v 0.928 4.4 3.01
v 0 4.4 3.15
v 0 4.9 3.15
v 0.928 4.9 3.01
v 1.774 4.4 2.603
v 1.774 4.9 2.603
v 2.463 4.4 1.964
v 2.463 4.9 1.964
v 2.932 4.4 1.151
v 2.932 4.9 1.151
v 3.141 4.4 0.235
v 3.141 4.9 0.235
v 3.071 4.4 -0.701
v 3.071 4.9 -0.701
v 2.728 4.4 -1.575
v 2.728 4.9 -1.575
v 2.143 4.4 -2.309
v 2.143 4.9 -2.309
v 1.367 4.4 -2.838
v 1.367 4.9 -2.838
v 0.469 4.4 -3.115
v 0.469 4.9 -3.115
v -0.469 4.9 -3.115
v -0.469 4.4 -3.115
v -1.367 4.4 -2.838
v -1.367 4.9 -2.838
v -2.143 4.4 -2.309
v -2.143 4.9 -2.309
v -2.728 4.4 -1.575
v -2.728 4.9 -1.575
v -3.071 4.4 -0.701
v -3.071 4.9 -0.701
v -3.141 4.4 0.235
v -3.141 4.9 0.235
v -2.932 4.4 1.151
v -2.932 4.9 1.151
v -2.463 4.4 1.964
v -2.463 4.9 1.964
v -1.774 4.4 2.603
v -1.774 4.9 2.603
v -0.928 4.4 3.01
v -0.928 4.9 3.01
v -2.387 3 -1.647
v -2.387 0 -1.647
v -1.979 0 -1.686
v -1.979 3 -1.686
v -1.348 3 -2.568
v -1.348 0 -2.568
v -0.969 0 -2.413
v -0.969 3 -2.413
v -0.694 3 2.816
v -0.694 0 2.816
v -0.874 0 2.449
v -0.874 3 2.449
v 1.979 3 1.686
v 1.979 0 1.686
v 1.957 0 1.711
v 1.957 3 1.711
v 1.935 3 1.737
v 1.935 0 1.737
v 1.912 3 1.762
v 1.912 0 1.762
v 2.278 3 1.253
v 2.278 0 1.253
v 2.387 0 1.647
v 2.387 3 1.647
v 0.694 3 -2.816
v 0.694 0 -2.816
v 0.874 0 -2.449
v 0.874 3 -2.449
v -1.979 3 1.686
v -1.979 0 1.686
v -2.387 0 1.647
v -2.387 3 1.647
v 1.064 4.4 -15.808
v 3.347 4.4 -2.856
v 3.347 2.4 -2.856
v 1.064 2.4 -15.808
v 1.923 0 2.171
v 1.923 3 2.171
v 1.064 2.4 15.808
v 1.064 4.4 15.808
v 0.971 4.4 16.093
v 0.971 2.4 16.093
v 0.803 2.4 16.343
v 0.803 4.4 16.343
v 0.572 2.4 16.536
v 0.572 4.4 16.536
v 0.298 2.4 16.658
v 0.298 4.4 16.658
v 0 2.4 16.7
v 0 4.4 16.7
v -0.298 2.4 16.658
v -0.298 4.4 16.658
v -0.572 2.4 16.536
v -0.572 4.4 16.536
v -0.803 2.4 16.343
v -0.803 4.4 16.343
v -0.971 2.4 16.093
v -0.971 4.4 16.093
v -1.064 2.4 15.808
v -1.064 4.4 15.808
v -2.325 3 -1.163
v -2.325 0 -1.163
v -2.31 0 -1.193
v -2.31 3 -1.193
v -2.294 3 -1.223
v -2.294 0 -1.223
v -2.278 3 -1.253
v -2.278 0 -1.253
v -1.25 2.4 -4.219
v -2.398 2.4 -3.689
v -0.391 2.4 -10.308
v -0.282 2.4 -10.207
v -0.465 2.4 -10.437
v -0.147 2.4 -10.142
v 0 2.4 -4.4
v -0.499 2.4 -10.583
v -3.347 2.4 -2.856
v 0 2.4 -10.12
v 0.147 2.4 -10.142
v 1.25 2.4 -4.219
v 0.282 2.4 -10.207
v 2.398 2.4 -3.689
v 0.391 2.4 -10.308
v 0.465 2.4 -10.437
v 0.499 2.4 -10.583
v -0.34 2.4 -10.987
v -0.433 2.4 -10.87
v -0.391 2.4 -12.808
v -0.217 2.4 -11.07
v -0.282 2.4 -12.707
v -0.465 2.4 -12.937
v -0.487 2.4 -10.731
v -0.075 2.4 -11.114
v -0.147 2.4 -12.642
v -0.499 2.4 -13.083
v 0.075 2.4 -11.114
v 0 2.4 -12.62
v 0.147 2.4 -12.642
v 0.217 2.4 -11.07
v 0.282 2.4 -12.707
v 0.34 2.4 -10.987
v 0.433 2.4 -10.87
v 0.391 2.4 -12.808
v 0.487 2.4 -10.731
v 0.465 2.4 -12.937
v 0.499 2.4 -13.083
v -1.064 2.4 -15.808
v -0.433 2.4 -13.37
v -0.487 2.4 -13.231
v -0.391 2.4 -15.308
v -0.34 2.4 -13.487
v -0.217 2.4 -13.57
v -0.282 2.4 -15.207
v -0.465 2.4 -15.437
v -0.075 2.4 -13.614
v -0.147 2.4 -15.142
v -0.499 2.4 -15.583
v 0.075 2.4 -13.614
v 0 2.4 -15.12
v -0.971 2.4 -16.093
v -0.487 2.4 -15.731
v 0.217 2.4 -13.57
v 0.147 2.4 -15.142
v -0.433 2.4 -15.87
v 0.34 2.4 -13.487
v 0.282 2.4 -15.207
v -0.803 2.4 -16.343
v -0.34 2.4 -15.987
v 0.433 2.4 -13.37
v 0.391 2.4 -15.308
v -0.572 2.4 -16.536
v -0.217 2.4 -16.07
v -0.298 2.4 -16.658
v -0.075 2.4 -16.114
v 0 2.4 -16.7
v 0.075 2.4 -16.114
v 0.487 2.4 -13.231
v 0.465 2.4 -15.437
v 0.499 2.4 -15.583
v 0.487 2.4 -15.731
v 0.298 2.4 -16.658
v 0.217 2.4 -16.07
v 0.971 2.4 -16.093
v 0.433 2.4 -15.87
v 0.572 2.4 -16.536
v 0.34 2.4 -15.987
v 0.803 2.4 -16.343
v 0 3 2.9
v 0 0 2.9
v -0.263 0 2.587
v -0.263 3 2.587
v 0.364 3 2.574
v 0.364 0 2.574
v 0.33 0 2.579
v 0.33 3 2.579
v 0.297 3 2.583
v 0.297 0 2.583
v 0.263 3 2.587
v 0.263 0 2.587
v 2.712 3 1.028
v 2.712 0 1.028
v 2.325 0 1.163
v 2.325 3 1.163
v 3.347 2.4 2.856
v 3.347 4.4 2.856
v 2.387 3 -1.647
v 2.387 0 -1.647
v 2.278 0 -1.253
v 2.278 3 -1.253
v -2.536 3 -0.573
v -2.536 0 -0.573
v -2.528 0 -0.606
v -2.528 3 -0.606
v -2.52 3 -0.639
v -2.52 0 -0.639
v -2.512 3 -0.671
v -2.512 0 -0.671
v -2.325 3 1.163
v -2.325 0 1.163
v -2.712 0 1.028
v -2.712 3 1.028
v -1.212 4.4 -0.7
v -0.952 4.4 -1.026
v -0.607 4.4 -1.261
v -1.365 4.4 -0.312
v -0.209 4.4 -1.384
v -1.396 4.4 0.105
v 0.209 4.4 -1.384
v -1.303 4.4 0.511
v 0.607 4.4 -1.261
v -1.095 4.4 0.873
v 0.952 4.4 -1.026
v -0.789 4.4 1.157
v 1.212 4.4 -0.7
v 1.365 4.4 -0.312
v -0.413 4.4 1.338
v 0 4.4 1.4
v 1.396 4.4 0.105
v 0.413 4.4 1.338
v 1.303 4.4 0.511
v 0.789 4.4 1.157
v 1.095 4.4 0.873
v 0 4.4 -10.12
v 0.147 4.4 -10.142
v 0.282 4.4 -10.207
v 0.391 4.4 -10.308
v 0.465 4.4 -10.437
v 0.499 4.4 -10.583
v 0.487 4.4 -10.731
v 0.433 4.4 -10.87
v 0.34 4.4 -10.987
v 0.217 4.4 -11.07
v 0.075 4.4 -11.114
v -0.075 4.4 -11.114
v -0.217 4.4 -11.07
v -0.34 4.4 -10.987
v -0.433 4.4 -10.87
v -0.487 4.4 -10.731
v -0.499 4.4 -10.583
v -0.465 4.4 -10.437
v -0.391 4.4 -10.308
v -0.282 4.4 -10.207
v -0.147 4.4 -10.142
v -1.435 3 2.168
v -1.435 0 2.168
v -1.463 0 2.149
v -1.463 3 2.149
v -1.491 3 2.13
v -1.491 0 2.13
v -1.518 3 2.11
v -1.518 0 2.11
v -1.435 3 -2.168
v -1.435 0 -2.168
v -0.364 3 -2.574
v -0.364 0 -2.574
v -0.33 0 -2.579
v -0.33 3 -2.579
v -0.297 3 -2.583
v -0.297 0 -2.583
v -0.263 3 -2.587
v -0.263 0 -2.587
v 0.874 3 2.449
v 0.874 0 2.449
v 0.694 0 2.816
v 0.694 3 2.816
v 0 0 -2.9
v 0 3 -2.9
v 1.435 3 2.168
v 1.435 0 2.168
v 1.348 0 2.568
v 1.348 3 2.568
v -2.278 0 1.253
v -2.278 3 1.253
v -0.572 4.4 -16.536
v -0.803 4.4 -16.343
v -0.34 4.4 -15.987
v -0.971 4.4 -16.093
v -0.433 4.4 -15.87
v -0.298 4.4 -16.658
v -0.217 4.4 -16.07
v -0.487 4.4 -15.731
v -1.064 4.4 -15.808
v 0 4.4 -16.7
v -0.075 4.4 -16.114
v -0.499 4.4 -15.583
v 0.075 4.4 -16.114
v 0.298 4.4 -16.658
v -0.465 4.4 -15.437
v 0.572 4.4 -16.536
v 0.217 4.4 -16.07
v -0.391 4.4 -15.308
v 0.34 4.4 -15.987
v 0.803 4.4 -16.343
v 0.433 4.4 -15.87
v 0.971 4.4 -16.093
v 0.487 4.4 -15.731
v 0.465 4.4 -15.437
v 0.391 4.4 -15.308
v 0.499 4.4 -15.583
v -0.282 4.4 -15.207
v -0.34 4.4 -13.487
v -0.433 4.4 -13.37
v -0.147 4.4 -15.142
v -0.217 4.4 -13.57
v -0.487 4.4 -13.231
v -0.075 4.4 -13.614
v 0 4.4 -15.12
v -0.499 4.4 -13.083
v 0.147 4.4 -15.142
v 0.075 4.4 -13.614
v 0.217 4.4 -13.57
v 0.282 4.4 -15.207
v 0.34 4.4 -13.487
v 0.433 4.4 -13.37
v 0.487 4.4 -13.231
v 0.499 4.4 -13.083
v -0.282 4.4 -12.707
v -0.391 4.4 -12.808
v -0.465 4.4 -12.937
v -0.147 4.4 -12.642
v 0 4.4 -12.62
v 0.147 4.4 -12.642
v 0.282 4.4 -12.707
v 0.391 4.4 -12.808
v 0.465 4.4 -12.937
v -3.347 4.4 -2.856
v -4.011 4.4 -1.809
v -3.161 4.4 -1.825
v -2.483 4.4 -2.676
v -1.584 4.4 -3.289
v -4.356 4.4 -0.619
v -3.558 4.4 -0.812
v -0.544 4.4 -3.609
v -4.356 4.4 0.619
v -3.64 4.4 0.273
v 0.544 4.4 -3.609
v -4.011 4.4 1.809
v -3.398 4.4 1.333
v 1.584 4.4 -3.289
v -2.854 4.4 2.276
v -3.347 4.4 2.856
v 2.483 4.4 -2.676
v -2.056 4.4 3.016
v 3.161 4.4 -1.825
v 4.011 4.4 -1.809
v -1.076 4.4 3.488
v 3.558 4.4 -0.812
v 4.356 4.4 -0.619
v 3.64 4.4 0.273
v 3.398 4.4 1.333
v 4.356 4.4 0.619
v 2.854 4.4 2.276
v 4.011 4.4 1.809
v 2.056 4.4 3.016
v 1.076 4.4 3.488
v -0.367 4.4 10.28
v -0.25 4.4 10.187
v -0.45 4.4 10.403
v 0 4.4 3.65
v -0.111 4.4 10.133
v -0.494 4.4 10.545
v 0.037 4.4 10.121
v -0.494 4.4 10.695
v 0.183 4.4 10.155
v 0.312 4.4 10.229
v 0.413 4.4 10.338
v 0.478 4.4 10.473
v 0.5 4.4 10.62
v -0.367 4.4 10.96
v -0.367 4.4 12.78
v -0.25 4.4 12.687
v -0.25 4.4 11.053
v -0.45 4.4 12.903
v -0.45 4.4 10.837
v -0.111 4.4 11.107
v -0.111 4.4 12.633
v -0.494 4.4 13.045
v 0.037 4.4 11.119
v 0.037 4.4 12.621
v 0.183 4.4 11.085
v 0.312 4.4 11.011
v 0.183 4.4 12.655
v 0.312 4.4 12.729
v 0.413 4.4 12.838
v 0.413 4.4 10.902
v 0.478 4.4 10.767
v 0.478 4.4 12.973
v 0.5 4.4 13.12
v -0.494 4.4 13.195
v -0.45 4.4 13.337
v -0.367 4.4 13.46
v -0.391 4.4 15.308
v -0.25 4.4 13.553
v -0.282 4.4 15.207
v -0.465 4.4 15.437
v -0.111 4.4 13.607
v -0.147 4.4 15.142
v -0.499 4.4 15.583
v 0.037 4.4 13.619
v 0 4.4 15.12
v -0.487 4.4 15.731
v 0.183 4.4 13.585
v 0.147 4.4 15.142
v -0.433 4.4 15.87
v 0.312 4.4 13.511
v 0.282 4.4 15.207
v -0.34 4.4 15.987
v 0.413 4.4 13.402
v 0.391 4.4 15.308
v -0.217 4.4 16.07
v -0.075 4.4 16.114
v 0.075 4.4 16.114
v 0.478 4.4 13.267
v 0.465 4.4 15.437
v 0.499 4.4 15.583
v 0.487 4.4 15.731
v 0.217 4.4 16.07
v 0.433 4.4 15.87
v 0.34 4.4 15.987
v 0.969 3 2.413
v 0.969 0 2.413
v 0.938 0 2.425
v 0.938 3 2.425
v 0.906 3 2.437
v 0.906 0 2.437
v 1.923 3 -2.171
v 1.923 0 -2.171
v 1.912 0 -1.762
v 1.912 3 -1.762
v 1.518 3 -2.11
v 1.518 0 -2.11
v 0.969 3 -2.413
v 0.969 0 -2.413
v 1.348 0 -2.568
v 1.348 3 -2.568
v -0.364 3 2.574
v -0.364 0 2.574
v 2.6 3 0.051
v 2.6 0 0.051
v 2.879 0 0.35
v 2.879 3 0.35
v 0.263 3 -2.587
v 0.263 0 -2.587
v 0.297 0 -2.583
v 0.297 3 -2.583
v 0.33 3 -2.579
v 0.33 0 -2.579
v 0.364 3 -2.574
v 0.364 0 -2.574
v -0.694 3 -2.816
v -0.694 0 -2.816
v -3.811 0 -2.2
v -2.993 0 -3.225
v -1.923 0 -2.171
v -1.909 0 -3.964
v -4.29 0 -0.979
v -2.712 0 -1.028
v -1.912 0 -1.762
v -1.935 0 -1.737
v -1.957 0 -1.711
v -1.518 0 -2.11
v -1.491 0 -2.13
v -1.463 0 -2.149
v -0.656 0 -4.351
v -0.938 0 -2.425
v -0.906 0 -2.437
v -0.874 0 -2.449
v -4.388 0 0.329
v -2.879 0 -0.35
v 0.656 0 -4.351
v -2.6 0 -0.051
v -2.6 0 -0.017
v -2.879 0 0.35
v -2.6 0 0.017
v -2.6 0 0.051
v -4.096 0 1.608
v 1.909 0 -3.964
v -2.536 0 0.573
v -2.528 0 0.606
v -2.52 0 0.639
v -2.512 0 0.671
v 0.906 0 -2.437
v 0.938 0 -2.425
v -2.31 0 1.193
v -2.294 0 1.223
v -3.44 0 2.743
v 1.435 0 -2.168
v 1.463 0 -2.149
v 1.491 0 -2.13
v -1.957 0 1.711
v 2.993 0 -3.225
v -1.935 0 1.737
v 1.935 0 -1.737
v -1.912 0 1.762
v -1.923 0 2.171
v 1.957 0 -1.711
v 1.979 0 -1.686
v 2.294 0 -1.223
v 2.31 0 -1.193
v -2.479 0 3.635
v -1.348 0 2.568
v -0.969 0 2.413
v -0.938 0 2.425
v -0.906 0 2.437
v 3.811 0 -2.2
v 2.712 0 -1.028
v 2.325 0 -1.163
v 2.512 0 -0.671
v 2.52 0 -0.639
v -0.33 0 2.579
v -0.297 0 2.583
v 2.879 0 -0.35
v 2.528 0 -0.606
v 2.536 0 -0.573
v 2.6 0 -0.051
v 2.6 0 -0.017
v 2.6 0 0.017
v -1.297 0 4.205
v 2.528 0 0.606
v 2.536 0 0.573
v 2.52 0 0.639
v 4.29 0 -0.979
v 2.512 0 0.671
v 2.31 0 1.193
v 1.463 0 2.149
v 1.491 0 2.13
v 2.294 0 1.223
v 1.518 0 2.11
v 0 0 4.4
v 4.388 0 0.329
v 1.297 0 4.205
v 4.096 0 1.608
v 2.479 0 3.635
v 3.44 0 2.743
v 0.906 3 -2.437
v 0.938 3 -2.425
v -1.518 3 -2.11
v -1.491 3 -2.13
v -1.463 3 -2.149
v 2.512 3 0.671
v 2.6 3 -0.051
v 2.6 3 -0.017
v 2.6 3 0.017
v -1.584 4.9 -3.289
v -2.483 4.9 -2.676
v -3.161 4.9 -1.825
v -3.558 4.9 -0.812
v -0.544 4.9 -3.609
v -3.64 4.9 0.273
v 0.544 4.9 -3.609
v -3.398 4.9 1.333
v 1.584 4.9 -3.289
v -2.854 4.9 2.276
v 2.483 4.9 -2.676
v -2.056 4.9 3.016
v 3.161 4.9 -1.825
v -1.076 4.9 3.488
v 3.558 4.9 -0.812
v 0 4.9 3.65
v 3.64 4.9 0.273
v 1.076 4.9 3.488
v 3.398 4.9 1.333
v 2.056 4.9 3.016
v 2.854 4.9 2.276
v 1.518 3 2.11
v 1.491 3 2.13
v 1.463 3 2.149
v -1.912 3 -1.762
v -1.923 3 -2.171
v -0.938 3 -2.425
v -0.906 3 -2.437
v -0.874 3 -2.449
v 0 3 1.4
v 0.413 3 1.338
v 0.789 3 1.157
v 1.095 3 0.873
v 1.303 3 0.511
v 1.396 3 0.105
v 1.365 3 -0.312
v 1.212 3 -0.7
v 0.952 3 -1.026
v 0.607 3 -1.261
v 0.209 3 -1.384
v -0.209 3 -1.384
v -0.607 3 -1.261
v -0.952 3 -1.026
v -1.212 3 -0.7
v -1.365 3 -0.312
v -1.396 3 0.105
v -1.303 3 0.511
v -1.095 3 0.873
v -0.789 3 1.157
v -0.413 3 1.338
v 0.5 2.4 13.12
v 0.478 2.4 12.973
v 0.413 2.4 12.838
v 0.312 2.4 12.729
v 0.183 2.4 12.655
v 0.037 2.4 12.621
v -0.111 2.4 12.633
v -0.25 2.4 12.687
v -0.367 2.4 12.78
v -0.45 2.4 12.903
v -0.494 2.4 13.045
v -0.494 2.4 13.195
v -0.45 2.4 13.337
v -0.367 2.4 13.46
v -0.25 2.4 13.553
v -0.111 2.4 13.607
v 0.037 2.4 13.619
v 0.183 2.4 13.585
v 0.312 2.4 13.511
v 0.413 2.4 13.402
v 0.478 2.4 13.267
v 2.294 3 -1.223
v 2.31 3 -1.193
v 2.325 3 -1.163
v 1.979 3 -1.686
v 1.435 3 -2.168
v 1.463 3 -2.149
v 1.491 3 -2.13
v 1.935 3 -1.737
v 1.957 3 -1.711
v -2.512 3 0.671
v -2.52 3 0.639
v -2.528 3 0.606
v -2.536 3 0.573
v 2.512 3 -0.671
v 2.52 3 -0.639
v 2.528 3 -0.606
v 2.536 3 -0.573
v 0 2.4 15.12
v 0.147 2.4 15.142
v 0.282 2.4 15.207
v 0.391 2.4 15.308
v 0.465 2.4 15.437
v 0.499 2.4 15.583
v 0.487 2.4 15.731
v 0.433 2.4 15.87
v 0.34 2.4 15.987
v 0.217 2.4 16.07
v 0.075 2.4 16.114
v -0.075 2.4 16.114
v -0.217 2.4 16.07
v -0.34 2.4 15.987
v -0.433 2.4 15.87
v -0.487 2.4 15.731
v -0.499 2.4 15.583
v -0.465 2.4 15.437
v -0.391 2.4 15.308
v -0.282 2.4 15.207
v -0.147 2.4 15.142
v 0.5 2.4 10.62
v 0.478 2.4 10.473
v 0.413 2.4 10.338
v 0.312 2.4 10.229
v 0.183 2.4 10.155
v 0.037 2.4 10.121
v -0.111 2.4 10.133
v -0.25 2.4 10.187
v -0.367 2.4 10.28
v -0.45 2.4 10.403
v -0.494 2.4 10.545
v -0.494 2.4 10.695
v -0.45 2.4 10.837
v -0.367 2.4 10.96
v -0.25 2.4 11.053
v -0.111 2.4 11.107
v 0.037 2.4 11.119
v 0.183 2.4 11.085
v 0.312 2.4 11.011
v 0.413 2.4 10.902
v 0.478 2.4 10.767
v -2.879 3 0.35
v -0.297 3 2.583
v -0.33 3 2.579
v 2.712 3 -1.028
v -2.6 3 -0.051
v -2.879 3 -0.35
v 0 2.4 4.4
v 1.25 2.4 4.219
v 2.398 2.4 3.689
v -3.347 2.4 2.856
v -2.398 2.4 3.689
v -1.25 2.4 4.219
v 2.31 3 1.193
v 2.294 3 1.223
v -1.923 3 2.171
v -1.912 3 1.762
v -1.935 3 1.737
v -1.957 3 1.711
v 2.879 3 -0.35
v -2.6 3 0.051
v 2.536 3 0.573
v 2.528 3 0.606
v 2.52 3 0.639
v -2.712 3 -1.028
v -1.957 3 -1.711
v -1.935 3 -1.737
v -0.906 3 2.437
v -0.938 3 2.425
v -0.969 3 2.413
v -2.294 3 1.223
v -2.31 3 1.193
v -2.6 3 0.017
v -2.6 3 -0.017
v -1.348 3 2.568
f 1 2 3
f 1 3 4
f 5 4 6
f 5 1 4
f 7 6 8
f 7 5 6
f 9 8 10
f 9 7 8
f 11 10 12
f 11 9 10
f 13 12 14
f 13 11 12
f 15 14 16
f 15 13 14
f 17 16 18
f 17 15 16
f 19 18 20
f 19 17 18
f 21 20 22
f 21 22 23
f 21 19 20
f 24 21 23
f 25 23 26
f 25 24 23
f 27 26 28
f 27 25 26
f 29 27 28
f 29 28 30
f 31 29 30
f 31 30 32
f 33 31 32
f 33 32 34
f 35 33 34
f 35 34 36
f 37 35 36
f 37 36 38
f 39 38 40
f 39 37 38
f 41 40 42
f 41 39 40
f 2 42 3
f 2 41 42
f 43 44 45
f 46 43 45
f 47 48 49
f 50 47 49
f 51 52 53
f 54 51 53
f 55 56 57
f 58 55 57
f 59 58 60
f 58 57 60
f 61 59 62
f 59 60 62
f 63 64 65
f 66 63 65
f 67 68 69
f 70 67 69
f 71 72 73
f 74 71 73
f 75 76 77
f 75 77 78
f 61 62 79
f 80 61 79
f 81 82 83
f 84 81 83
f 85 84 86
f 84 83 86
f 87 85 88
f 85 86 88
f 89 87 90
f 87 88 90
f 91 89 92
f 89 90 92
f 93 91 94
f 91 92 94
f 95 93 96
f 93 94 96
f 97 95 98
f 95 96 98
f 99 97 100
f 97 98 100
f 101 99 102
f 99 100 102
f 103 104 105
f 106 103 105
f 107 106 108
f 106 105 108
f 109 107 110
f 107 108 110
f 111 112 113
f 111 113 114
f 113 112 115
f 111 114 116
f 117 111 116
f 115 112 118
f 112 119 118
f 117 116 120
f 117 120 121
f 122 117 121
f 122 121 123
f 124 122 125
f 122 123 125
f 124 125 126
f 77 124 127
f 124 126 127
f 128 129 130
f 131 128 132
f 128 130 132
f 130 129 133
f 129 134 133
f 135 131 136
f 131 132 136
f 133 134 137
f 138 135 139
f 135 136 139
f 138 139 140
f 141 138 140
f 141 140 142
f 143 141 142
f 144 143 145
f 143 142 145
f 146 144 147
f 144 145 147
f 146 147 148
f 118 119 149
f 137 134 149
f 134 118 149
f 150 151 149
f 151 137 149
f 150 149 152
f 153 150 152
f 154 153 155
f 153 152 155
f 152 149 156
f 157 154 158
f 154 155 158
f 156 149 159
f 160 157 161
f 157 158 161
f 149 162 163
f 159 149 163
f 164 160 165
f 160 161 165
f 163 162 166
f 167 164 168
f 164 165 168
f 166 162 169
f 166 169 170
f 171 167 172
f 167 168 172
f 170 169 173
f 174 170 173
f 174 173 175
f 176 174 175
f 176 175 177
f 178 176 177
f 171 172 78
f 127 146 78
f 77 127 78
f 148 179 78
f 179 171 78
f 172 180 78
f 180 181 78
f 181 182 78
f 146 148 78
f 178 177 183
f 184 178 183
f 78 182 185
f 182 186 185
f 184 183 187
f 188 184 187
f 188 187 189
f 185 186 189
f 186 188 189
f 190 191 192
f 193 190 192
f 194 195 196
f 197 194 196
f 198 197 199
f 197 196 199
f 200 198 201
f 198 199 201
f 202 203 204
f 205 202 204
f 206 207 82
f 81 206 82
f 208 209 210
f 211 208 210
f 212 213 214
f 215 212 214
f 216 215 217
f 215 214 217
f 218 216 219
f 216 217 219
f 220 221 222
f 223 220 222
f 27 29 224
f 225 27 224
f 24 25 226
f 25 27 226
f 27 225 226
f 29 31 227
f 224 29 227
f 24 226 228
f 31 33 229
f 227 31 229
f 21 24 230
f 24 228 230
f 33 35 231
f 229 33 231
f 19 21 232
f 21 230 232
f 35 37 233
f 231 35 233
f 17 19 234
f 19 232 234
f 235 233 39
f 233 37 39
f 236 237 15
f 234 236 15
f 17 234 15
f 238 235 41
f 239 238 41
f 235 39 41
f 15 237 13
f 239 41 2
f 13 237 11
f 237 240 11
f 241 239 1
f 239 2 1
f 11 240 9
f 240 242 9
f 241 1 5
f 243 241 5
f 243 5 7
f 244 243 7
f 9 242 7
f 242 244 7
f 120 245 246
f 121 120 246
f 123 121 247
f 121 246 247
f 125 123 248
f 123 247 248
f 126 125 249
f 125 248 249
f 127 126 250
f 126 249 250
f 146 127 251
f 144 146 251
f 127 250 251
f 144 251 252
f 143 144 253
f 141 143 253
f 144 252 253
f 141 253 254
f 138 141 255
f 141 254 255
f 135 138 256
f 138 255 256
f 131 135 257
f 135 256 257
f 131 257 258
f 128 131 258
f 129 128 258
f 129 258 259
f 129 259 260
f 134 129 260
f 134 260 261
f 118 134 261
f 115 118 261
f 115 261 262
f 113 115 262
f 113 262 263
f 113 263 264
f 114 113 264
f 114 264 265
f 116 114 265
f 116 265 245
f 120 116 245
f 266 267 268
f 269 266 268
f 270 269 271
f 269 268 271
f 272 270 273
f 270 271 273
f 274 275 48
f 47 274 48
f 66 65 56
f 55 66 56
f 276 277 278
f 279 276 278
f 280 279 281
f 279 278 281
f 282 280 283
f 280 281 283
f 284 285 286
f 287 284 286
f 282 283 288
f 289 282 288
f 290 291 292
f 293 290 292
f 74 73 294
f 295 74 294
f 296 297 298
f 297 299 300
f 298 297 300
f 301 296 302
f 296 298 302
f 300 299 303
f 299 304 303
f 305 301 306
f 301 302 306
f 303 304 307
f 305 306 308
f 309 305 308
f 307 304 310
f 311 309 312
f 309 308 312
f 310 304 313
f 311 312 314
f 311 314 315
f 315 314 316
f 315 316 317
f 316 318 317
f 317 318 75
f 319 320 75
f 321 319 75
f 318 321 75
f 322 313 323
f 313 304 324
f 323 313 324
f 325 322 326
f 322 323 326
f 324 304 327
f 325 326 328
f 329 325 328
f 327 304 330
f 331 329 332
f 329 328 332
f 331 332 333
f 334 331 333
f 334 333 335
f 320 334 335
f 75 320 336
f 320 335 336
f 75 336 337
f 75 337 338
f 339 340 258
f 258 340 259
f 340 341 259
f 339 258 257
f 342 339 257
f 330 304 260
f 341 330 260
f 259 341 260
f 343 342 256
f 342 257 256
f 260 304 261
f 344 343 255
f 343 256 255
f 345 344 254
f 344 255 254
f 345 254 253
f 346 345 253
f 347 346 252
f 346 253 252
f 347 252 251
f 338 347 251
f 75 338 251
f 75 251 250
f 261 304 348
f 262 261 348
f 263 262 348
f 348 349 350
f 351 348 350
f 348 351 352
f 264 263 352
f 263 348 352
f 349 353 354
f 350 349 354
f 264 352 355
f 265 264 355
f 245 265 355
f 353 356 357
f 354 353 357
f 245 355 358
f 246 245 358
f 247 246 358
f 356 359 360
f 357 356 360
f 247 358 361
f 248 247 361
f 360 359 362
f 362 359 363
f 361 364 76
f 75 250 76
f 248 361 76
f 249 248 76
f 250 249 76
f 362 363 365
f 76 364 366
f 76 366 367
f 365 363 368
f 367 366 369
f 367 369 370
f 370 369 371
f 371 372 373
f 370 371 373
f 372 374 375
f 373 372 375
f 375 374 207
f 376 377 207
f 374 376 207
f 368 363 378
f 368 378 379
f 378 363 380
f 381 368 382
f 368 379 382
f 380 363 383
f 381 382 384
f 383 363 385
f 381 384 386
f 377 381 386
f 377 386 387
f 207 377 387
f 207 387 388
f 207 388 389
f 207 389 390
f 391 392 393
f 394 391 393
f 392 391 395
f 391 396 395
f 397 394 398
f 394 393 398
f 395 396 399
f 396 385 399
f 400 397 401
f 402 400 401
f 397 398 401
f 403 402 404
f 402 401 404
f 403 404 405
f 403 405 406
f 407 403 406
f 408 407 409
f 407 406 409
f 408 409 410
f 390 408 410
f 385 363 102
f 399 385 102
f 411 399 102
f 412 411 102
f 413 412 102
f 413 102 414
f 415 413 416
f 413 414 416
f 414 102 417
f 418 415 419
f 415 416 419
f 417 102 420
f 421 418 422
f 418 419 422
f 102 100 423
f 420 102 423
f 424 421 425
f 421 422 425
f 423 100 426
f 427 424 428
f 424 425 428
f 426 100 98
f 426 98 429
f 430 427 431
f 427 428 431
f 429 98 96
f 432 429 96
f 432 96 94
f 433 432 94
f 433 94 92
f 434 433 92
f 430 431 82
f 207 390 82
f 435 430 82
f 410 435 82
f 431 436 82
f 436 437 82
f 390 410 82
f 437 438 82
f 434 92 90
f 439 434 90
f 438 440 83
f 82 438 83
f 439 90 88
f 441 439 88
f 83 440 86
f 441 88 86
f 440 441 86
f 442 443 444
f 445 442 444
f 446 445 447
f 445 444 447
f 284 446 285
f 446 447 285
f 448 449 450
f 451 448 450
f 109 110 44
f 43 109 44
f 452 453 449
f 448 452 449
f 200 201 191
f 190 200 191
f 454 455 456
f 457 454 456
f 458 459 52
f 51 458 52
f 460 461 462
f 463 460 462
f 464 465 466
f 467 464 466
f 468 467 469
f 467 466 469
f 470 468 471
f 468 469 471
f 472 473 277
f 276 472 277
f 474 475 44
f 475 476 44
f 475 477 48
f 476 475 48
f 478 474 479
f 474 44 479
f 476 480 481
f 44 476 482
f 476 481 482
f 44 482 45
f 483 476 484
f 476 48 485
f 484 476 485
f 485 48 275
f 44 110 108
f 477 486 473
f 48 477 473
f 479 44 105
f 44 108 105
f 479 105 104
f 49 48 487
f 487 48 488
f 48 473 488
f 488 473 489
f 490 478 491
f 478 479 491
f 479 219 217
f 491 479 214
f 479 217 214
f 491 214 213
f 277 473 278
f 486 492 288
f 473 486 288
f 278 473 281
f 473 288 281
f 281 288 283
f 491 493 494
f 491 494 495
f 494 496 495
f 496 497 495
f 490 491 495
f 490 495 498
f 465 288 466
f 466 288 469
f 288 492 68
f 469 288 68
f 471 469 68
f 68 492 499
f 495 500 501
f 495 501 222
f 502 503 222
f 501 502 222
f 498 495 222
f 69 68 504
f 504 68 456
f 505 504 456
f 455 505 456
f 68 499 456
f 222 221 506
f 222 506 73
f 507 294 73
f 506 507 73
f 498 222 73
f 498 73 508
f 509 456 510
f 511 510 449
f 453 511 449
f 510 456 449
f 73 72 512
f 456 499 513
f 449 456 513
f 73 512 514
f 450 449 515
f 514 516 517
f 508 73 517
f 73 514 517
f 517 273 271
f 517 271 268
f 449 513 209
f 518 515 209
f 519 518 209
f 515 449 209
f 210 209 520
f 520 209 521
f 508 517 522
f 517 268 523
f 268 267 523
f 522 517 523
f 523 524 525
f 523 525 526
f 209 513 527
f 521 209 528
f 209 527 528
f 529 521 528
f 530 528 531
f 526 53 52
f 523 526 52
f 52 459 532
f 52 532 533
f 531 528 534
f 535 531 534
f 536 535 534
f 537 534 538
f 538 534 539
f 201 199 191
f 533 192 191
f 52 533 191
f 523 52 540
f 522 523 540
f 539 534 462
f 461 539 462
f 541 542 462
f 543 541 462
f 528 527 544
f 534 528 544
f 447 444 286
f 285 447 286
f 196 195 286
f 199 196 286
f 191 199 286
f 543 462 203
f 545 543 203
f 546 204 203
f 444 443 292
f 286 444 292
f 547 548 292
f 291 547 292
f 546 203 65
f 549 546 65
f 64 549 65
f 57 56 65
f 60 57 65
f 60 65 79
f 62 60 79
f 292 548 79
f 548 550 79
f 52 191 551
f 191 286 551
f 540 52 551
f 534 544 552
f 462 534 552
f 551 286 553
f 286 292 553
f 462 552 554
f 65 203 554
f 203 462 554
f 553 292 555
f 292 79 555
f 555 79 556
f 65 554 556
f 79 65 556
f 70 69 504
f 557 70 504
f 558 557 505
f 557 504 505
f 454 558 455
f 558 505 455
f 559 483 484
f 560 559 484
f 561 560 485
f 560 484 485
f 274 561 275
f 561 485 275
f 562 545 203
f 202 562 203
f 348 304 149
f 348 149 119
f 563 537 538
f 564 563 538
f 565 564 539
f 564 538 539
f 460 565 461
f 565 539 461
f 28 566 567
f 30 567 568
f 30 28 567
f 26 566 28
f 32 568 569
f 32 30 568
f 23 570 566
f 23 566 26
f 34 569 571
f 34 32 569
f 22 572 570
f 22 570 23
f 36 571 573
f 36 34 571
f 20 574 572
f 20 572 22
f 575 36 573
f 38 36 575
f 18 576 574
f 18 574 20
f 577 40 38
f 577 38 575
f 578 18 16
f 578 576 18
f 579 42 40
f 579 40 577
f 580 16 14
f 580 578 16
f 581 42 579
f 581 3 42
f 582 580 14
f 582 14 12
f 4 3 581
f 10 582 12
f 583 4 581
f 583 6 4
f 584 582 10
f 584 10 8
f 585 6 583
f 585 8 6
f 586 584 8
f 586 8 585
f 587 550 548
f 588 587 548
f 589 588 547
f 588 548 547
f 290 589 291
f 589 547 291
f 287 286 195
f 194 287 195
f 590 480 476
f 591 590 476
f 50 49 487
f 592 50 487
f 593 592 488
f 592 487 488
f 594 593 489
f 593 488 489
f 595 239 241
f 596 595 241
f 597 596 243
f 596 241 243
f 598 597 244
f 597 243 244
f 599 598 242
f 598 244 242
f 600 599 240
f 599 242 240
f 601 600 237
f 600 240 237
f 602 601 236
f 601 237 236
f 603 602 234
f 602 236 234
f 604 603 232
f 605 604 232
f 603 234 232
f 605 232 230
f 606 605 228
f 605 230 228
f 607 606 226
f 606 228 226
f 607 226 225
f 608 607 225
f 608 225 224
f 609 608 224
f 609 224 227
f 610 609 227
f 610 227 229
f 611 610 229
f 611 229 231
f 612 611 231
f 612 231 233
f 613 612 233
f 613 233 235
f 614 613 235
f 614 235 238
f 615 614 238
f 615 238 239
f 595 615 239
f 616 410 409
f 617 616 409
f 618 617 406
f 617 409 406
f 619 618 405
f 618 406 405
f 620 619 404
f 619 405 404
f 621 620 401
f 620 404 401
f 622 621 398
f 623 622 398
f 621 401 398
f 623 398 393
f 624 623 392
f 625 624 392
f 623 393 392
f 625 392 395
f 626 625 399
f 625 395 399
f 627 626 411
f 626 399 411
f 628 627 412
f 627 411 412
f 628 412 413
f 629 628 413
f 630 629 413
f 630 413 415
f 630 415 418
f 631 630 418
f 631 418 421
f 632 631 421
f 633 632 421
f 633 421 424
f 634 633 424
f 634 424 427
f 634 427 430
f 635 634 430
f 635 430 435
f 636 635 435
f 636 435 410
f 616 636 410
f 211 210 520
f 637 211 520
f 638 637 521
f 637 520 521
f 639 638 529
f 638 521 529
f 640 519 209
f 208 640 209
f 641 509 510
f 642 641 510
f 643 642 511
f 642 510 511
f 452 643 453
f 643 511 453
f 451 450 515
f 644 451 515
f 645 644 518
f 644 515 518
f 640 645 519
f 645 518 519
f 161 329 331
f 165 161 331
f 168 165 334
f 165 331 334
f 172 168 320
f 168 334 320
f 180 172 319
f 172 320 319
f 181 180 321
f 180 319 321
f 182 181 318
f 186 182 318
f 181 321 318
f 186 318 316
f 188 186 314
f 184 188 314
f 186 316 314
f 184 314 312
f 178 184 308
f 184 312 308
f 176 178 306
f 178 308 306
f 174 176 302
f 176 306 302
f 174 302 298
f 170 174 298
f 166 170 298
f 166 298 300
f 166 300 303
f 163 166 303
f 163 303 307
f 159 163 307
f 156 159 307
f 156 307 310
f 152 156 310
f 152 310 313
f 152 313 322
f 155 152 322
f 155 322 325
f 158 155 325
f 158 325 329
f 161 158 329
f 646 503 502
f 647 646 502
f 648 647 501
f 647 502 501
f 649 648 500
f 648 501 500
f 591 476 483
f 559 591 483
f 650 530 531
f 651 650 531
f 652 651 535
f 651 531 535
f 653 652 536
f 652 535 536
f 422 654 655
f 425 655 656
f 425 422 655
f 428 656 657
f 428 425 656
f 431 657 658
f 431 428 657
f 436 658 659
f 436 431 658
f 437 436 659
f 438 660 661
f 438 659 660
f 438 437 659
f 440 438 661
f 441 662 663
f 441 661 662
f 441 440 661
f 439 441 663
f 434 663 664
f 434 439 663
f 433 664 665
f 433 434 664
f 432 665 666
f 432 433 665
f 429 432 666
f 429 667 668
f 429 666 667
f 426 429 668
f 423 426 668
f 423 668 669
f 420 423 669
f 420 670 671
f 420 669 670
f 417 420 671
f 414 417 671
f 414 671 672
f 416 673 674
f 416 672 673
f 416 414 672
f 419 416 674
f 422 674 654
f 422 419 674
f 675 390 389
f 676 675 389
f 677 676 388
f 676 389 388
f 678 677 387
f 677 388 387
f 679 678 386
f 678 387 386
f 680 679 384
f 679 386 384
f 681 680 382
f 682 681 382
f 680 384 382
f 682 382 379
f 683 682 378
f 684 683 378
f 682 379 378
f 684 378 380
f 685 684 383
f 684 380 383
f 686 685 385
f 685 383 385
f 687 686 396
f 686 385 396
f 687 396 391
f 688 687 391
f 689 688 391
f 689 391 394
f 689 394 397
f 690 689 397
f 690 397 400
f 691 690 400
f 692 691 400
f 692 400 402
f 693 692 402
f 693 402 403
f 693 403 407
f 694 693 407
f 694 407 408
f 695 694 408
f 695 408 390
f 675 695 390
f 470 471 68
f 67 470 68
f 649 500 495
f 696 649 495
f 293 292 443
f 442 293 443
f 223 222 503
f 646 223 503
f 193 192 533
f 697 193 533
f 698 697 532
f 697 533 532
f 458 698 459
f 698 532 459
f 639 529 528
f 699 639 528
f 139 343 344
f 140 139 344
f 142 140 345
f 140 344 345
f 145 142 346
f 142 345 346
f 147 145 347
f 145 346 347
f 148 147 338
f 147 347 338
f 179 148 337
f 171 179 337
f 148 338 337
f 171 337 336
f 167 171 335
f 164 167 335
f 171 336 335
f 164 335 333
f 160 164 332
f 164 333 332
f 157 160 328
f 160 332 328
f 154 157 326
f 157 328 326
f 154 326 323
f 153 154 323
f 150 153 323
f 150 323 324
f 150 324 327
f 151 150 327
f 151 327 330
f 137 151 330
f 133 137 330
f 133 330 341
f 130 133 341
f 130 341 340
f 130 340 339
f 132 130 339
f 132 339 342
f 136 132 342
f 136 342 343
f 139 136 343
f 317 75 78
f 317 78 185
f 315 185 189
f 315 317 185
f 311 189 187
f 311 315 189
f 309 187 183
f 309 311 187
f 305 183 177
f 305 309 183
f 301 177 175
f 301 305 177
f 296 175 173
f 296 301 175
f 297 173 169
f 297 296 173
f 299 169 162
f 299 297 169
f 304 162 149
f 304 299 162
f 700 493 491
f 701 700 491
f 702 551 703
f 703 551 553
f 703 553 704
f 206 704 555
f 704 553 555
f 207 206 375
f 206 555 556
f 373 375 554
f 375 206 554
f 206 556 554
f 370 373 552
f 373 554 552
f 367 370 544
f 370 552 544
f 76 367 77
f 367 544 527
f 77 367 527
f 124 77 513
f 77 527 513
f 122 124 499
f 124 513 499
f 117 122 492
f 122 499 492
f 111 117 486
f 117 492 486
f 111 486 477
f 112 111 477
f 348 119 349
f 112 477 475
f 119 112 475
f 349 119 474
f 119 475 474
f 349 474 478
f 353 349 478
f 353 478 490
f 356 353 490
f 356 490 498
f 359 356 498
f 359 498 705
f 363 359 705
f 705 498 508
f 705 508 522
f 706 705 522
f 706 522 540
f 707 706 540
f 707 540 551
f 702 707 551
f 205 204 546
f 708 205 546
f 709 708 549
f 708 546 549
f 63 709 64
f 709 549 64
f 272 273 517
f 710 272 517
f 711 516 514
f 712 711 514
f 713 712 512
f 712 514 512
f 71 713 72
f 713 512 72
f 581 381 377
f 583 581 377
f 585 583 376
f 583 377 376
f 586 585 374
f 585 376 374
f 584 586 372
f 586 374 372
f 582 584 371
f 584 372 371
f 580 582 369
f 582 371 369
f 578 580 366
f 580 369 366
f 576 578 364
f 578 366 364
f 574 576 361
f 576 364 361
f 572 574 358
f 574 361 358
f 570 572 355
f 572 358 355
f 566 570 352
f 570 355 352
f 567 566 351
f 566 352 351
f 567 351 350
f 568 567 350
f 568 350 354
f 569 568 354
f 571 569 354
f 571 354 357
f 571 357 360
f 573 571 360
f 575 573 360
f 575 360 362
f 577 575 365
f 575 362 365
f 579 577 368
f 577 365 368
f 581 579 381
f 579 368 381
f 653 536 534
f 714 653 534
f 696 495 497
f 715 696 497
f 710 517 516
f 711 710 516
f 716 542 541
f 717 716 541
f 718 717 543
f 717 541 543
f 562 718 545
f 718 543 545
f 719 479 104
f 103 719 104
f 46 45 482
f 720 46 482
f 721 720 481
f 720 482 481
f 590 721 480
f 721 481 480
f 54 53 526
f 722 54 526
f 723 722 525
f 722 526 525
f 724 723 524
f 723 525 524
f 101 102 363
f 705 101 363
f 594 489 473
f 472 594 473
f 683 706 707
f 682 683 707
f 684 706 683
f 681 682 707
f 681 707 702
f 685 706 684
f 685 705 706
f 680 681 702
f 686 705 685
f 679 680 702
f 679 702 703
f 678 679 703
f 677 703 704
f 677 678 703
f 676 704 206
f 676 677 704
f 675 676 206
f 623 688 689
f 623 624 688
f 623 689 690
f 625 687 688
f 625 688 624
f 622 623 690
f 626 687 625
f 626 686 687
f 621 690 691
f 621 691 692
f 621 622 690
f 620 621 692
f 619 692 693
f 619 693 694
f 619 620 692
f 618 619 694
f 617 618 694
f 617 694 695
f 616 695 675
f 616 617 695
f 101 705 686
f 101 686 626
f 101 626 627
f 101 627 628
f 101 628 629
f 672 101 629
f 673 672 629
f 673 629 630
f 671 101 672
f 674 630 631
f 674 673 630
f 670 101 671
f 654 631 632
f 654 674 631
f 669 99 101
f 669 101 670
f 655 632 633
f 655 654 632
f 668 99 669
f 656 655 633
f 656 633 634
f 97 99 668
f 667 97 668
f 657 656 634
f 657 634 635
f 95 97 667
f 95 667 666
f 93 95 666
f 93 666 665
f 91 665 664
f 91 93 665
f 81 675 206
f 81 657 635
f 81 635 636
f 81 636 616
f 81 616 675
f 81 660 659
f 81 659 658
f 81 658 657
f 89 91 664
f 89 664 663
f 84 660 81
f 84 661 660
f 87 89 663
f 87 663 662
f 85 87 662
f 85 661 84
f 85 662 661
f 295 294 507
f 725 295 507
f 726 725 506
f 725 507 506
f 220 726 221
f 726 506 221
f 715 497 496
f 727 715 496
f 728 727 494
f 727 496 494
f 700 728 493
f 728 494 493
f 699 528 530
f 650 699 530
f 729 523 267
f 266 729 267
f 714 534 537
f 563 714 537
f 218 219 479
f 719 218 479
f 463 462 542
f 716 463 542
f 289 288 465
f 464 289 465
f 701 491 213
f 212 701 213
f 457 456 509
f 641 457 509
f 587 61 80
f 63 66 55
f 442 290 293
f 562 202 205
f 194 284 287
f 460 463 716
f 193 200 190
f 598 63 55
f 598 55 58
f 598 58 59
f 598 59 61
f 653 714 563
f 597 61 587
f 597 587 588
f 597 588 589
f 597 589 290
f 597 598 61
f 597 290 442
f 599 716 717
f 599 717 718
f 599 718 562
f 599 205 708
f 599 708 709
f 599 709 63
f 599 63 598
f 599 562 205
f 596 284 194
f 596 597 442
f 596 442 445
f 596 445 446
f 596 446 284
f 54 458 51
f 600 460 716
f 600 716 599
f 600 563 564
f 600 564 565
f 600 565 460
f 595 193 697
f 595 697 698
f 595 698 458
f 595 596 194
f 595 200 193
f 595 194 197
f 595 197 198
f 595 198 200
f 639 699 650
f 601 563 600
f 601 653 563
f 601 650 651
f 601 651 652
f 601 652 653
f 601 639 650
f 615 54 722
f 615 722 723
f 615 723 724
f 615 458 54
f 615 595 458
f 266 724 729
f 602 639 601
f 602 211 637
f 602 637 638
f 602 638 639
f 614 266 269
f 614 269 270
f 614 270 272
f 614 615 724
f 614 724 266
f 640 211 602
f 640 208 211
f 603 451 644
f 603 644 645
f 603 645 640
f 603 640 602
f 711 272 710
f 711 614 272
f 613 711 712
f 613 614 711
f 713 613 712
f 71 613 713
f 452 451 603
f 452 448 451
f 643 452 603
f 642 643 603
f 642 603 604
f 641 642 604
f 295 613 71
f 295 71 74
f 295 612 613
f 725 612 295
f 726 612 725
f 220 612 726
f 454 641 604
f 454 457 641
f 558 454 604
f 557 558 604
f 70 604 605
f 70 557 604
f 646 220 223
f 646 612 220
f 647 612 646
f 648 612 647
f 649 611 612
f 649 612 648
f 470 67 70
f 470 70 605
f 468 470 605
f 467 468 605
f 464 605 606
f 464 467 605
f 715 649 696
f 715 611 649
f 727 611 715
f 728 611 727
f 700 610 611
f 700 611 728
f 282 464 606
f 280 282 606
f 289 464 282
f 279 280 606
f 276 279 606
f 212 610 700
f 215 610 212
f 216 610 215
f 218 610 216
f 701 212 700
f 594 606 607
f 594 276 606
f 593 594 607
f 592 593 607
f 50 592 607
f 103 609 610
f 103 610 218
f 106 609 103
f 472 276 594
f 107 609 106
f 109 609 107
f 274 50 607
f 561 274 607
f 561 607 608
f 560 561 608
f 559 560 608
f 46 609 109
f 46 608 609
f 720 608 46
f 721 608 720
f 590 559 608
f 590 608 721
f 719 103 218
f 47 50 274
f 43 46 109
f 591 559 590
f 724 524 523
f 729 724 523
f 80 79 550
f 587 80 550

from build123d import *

# Parameters (mm, degrees)
BASES_R                     = 4.4
BASE_DEPTH                  = 4.4
TOPBORES_R                  = 1.4
TOP_BORE_DEPTH              = 8.621023553
HORN_HALF_DEPTH             = 2
HORNATTACHS_R               = 0.5
HORN_ATTACH_DEPTH           = 18.821616088
HA_LP_COUNT                 = 3
HA_LP_PITCH                 = 2.5
HORN_BODIES_COPY_1_SKETCH_R = 0.5
HORN_BODIES_COPY_1_DEPTH    = 18.821616088
HORN_BODIES_COPY_2_SKETCH_R = 0.5
HORN_BODIES_COPY_2_DEPTH    = 18.821616088
TOOTH_DEPTH                 = 3
TOOTH_CP_COUNT              = 26
BOTTOMBORES_R               = 2.6
BOTTOM_BORE_DEPTH           = 3
TOPPOCKETCYLINDERS_R        = 3.65
TOPPOCKETCYLINDERS_R_2      = 3.15
TOP_POCKET_CYLINDER_DEPTH   = 0.5


with BuildPart() as part:
    # BaseS → BASE (new body)
    with BuildSketch(Plane(origin=(0, 0, 0), x_dir=(1, 0, 0), z_dir=(0, 1, 0))):
        with Locations(Location((0, 0, 0), (0, 0, 270))):
            Circle(BASES_R)
    extrude(amount=BASE_DEPTH)

    # TopBoreS → TOP BORE (cut, through all)
    with BuildSketch(Plane(origin=(0, 4.4, 0), x_dir=(1, 0, 0), z_dir=(0, 1, 0))):
        with Locations(Location((0, 0, 0), (0, 0, 270))):
            Circle(TOPBORES_R)
    extrude(amount=-TOP_BORE_DEPTH, mode=Mode.SUBTRACT)

    # HornHalfS → HORN HALF (add)
    with BuildSketch(Plane(origin=(0, 4.4, 0), x_dir=(1, 0, 0), z_dir=(0, 1, 0))):
        with BuildLine():
            Line((-1.063592373, 15.807540032), (-3.347342764, 2.855747962))
            ThreePointArc((-3.347342764, 2.855747962), (0, 4.4), (3.347342764, 2.855747962))
            Line((3.347342764, 2.855747962), (1.063592373, 15.807540032))
            ThreePointArc((1.063592373, 15.807540032), (0, 16.7), (-1.063592373, 15.807540032))
        make_face()
    horn_half = extrude(amount=-HORN_HALF_DEPTH)

    # HornAttachS → HORN ATTACH (cut, through all)
    with BuildSketch(Plane(origin=(0, 4.4, 0), x_dir=(1, 0, 0), z_dir=(0, 1, 0))):
        with Locations(Location((0, 15.62, 0), (0, 0, 270))):
            Circle(HORNATTACHS_R)
    horn_attach = extrude(amount=-HORN_ATTACH_DEPTH, mode=Mode.SUBTRACT)

    # HA LP: HORN ATTACH ×3
    with Locations(*[(0, 0, i * HA_LP_PITCH) for i in range(1, HA_LP_COUNT)]):
        add(horn_attach, mode=Mode.SUBTRACT)

    # HORN BODIES: HORN HALF, HORN ATTACH across plane
    add(horn_half.mirror(Plane.XY))
    add(horn_attach.mirror(Plane.XY), mode=Mode.SUBTRACT)

    # HORN BODIES copy 1 sketch → HORN BODIES copy 1 (cut, through all)
    with BuildSketch(Plane(origin=(0, 4.4, -2.5), x_dir=(1, 0, 0), z_dir=(0, 1, 0))):
        with Locations((0, -15.62)):
            Circle(HORN_BODIES_COPY_1_SKETCH_R)
    extrude(amount=-HORN_BODIES_COPY_1_DEPTH, mode=Mode.SUBTRACT)

    # HORN BODIES copy 2 sketch → HORN BODIES copy 2 (cut, through all)
    with BuildSketch(Plane(origin=(0, 4.4, -5), x_dir=(1, 0, 0), z_dir=(0, 1, 0))):
        with Locations((0, -15.62)):
            Circle(HORN_BODIES_COPY_2_SKETCH_R)
    extrude(amount=-HORN_BODIES_COPY_2_DEPTH, mode=Mode.SUBTRACT)

    # ToothS → TOOTH (cut)
    with BuildSketch(Plane.XZ):
        with BuildLine():
            Line((0, -2.9), (0.262912611, -2.586672952))
            ThreePointArc((0.262912611, -2.586672952), (0, -2.6), (-0.262912611, -2.586672952))
            Line((-0.262912611, -2.586672952), (0, -2.9))
        make_face()
    tooth = extrude(amount=-TOOTH_DEPTH, mode=Mode.SUBTRACT)

    # TOOTH CP: TOOTH ×26 about axis
    tooth_cp_axis = Axis((0, 0, 0), (0, 1, 0))
    for i in range(1, TOOTH_CP_COUNT):
        add(tooth.rotate(tooth_cp_axis, i * 360 / TOOTH_CP_COUNT), mode=Mode.SUBTRACT)

    # BottomBoreS → BOTTOM BORE (cut)
    with BuildSketch(Plane(origin=(0, 0, 0), x_dir=(-1, 0, 0), z_dir=(0, -1, 0))):
        Circle(BOTTOMBORES_R)
    extrude(amount=-BOTTOM_BORE_DEPTH, mode=Mode.SUBTRACT)

    # TopPocketCylinderS → TOP POCKET CYLINDER (add)
    with BuildSketch(Plane(origin=(0, 4.4, 0), x_dir=(1, 0, 0), z_dir=(0, 1, 0))):
        with Locations(Location((0, 0, 0), (0, 0, 270))):
            Circle(TOPPOCKETCYLINDERS_R)
        with Locations(Location((0, 0, 0), (0, 0, 270))):
            Circle(TOPPOCKETCYLINDERS_R_2, mode=Mode.SUBTRACT)
    extrude(amount=TOP_POCKET_CYLINDER_DEPTH)


solid = part.part
